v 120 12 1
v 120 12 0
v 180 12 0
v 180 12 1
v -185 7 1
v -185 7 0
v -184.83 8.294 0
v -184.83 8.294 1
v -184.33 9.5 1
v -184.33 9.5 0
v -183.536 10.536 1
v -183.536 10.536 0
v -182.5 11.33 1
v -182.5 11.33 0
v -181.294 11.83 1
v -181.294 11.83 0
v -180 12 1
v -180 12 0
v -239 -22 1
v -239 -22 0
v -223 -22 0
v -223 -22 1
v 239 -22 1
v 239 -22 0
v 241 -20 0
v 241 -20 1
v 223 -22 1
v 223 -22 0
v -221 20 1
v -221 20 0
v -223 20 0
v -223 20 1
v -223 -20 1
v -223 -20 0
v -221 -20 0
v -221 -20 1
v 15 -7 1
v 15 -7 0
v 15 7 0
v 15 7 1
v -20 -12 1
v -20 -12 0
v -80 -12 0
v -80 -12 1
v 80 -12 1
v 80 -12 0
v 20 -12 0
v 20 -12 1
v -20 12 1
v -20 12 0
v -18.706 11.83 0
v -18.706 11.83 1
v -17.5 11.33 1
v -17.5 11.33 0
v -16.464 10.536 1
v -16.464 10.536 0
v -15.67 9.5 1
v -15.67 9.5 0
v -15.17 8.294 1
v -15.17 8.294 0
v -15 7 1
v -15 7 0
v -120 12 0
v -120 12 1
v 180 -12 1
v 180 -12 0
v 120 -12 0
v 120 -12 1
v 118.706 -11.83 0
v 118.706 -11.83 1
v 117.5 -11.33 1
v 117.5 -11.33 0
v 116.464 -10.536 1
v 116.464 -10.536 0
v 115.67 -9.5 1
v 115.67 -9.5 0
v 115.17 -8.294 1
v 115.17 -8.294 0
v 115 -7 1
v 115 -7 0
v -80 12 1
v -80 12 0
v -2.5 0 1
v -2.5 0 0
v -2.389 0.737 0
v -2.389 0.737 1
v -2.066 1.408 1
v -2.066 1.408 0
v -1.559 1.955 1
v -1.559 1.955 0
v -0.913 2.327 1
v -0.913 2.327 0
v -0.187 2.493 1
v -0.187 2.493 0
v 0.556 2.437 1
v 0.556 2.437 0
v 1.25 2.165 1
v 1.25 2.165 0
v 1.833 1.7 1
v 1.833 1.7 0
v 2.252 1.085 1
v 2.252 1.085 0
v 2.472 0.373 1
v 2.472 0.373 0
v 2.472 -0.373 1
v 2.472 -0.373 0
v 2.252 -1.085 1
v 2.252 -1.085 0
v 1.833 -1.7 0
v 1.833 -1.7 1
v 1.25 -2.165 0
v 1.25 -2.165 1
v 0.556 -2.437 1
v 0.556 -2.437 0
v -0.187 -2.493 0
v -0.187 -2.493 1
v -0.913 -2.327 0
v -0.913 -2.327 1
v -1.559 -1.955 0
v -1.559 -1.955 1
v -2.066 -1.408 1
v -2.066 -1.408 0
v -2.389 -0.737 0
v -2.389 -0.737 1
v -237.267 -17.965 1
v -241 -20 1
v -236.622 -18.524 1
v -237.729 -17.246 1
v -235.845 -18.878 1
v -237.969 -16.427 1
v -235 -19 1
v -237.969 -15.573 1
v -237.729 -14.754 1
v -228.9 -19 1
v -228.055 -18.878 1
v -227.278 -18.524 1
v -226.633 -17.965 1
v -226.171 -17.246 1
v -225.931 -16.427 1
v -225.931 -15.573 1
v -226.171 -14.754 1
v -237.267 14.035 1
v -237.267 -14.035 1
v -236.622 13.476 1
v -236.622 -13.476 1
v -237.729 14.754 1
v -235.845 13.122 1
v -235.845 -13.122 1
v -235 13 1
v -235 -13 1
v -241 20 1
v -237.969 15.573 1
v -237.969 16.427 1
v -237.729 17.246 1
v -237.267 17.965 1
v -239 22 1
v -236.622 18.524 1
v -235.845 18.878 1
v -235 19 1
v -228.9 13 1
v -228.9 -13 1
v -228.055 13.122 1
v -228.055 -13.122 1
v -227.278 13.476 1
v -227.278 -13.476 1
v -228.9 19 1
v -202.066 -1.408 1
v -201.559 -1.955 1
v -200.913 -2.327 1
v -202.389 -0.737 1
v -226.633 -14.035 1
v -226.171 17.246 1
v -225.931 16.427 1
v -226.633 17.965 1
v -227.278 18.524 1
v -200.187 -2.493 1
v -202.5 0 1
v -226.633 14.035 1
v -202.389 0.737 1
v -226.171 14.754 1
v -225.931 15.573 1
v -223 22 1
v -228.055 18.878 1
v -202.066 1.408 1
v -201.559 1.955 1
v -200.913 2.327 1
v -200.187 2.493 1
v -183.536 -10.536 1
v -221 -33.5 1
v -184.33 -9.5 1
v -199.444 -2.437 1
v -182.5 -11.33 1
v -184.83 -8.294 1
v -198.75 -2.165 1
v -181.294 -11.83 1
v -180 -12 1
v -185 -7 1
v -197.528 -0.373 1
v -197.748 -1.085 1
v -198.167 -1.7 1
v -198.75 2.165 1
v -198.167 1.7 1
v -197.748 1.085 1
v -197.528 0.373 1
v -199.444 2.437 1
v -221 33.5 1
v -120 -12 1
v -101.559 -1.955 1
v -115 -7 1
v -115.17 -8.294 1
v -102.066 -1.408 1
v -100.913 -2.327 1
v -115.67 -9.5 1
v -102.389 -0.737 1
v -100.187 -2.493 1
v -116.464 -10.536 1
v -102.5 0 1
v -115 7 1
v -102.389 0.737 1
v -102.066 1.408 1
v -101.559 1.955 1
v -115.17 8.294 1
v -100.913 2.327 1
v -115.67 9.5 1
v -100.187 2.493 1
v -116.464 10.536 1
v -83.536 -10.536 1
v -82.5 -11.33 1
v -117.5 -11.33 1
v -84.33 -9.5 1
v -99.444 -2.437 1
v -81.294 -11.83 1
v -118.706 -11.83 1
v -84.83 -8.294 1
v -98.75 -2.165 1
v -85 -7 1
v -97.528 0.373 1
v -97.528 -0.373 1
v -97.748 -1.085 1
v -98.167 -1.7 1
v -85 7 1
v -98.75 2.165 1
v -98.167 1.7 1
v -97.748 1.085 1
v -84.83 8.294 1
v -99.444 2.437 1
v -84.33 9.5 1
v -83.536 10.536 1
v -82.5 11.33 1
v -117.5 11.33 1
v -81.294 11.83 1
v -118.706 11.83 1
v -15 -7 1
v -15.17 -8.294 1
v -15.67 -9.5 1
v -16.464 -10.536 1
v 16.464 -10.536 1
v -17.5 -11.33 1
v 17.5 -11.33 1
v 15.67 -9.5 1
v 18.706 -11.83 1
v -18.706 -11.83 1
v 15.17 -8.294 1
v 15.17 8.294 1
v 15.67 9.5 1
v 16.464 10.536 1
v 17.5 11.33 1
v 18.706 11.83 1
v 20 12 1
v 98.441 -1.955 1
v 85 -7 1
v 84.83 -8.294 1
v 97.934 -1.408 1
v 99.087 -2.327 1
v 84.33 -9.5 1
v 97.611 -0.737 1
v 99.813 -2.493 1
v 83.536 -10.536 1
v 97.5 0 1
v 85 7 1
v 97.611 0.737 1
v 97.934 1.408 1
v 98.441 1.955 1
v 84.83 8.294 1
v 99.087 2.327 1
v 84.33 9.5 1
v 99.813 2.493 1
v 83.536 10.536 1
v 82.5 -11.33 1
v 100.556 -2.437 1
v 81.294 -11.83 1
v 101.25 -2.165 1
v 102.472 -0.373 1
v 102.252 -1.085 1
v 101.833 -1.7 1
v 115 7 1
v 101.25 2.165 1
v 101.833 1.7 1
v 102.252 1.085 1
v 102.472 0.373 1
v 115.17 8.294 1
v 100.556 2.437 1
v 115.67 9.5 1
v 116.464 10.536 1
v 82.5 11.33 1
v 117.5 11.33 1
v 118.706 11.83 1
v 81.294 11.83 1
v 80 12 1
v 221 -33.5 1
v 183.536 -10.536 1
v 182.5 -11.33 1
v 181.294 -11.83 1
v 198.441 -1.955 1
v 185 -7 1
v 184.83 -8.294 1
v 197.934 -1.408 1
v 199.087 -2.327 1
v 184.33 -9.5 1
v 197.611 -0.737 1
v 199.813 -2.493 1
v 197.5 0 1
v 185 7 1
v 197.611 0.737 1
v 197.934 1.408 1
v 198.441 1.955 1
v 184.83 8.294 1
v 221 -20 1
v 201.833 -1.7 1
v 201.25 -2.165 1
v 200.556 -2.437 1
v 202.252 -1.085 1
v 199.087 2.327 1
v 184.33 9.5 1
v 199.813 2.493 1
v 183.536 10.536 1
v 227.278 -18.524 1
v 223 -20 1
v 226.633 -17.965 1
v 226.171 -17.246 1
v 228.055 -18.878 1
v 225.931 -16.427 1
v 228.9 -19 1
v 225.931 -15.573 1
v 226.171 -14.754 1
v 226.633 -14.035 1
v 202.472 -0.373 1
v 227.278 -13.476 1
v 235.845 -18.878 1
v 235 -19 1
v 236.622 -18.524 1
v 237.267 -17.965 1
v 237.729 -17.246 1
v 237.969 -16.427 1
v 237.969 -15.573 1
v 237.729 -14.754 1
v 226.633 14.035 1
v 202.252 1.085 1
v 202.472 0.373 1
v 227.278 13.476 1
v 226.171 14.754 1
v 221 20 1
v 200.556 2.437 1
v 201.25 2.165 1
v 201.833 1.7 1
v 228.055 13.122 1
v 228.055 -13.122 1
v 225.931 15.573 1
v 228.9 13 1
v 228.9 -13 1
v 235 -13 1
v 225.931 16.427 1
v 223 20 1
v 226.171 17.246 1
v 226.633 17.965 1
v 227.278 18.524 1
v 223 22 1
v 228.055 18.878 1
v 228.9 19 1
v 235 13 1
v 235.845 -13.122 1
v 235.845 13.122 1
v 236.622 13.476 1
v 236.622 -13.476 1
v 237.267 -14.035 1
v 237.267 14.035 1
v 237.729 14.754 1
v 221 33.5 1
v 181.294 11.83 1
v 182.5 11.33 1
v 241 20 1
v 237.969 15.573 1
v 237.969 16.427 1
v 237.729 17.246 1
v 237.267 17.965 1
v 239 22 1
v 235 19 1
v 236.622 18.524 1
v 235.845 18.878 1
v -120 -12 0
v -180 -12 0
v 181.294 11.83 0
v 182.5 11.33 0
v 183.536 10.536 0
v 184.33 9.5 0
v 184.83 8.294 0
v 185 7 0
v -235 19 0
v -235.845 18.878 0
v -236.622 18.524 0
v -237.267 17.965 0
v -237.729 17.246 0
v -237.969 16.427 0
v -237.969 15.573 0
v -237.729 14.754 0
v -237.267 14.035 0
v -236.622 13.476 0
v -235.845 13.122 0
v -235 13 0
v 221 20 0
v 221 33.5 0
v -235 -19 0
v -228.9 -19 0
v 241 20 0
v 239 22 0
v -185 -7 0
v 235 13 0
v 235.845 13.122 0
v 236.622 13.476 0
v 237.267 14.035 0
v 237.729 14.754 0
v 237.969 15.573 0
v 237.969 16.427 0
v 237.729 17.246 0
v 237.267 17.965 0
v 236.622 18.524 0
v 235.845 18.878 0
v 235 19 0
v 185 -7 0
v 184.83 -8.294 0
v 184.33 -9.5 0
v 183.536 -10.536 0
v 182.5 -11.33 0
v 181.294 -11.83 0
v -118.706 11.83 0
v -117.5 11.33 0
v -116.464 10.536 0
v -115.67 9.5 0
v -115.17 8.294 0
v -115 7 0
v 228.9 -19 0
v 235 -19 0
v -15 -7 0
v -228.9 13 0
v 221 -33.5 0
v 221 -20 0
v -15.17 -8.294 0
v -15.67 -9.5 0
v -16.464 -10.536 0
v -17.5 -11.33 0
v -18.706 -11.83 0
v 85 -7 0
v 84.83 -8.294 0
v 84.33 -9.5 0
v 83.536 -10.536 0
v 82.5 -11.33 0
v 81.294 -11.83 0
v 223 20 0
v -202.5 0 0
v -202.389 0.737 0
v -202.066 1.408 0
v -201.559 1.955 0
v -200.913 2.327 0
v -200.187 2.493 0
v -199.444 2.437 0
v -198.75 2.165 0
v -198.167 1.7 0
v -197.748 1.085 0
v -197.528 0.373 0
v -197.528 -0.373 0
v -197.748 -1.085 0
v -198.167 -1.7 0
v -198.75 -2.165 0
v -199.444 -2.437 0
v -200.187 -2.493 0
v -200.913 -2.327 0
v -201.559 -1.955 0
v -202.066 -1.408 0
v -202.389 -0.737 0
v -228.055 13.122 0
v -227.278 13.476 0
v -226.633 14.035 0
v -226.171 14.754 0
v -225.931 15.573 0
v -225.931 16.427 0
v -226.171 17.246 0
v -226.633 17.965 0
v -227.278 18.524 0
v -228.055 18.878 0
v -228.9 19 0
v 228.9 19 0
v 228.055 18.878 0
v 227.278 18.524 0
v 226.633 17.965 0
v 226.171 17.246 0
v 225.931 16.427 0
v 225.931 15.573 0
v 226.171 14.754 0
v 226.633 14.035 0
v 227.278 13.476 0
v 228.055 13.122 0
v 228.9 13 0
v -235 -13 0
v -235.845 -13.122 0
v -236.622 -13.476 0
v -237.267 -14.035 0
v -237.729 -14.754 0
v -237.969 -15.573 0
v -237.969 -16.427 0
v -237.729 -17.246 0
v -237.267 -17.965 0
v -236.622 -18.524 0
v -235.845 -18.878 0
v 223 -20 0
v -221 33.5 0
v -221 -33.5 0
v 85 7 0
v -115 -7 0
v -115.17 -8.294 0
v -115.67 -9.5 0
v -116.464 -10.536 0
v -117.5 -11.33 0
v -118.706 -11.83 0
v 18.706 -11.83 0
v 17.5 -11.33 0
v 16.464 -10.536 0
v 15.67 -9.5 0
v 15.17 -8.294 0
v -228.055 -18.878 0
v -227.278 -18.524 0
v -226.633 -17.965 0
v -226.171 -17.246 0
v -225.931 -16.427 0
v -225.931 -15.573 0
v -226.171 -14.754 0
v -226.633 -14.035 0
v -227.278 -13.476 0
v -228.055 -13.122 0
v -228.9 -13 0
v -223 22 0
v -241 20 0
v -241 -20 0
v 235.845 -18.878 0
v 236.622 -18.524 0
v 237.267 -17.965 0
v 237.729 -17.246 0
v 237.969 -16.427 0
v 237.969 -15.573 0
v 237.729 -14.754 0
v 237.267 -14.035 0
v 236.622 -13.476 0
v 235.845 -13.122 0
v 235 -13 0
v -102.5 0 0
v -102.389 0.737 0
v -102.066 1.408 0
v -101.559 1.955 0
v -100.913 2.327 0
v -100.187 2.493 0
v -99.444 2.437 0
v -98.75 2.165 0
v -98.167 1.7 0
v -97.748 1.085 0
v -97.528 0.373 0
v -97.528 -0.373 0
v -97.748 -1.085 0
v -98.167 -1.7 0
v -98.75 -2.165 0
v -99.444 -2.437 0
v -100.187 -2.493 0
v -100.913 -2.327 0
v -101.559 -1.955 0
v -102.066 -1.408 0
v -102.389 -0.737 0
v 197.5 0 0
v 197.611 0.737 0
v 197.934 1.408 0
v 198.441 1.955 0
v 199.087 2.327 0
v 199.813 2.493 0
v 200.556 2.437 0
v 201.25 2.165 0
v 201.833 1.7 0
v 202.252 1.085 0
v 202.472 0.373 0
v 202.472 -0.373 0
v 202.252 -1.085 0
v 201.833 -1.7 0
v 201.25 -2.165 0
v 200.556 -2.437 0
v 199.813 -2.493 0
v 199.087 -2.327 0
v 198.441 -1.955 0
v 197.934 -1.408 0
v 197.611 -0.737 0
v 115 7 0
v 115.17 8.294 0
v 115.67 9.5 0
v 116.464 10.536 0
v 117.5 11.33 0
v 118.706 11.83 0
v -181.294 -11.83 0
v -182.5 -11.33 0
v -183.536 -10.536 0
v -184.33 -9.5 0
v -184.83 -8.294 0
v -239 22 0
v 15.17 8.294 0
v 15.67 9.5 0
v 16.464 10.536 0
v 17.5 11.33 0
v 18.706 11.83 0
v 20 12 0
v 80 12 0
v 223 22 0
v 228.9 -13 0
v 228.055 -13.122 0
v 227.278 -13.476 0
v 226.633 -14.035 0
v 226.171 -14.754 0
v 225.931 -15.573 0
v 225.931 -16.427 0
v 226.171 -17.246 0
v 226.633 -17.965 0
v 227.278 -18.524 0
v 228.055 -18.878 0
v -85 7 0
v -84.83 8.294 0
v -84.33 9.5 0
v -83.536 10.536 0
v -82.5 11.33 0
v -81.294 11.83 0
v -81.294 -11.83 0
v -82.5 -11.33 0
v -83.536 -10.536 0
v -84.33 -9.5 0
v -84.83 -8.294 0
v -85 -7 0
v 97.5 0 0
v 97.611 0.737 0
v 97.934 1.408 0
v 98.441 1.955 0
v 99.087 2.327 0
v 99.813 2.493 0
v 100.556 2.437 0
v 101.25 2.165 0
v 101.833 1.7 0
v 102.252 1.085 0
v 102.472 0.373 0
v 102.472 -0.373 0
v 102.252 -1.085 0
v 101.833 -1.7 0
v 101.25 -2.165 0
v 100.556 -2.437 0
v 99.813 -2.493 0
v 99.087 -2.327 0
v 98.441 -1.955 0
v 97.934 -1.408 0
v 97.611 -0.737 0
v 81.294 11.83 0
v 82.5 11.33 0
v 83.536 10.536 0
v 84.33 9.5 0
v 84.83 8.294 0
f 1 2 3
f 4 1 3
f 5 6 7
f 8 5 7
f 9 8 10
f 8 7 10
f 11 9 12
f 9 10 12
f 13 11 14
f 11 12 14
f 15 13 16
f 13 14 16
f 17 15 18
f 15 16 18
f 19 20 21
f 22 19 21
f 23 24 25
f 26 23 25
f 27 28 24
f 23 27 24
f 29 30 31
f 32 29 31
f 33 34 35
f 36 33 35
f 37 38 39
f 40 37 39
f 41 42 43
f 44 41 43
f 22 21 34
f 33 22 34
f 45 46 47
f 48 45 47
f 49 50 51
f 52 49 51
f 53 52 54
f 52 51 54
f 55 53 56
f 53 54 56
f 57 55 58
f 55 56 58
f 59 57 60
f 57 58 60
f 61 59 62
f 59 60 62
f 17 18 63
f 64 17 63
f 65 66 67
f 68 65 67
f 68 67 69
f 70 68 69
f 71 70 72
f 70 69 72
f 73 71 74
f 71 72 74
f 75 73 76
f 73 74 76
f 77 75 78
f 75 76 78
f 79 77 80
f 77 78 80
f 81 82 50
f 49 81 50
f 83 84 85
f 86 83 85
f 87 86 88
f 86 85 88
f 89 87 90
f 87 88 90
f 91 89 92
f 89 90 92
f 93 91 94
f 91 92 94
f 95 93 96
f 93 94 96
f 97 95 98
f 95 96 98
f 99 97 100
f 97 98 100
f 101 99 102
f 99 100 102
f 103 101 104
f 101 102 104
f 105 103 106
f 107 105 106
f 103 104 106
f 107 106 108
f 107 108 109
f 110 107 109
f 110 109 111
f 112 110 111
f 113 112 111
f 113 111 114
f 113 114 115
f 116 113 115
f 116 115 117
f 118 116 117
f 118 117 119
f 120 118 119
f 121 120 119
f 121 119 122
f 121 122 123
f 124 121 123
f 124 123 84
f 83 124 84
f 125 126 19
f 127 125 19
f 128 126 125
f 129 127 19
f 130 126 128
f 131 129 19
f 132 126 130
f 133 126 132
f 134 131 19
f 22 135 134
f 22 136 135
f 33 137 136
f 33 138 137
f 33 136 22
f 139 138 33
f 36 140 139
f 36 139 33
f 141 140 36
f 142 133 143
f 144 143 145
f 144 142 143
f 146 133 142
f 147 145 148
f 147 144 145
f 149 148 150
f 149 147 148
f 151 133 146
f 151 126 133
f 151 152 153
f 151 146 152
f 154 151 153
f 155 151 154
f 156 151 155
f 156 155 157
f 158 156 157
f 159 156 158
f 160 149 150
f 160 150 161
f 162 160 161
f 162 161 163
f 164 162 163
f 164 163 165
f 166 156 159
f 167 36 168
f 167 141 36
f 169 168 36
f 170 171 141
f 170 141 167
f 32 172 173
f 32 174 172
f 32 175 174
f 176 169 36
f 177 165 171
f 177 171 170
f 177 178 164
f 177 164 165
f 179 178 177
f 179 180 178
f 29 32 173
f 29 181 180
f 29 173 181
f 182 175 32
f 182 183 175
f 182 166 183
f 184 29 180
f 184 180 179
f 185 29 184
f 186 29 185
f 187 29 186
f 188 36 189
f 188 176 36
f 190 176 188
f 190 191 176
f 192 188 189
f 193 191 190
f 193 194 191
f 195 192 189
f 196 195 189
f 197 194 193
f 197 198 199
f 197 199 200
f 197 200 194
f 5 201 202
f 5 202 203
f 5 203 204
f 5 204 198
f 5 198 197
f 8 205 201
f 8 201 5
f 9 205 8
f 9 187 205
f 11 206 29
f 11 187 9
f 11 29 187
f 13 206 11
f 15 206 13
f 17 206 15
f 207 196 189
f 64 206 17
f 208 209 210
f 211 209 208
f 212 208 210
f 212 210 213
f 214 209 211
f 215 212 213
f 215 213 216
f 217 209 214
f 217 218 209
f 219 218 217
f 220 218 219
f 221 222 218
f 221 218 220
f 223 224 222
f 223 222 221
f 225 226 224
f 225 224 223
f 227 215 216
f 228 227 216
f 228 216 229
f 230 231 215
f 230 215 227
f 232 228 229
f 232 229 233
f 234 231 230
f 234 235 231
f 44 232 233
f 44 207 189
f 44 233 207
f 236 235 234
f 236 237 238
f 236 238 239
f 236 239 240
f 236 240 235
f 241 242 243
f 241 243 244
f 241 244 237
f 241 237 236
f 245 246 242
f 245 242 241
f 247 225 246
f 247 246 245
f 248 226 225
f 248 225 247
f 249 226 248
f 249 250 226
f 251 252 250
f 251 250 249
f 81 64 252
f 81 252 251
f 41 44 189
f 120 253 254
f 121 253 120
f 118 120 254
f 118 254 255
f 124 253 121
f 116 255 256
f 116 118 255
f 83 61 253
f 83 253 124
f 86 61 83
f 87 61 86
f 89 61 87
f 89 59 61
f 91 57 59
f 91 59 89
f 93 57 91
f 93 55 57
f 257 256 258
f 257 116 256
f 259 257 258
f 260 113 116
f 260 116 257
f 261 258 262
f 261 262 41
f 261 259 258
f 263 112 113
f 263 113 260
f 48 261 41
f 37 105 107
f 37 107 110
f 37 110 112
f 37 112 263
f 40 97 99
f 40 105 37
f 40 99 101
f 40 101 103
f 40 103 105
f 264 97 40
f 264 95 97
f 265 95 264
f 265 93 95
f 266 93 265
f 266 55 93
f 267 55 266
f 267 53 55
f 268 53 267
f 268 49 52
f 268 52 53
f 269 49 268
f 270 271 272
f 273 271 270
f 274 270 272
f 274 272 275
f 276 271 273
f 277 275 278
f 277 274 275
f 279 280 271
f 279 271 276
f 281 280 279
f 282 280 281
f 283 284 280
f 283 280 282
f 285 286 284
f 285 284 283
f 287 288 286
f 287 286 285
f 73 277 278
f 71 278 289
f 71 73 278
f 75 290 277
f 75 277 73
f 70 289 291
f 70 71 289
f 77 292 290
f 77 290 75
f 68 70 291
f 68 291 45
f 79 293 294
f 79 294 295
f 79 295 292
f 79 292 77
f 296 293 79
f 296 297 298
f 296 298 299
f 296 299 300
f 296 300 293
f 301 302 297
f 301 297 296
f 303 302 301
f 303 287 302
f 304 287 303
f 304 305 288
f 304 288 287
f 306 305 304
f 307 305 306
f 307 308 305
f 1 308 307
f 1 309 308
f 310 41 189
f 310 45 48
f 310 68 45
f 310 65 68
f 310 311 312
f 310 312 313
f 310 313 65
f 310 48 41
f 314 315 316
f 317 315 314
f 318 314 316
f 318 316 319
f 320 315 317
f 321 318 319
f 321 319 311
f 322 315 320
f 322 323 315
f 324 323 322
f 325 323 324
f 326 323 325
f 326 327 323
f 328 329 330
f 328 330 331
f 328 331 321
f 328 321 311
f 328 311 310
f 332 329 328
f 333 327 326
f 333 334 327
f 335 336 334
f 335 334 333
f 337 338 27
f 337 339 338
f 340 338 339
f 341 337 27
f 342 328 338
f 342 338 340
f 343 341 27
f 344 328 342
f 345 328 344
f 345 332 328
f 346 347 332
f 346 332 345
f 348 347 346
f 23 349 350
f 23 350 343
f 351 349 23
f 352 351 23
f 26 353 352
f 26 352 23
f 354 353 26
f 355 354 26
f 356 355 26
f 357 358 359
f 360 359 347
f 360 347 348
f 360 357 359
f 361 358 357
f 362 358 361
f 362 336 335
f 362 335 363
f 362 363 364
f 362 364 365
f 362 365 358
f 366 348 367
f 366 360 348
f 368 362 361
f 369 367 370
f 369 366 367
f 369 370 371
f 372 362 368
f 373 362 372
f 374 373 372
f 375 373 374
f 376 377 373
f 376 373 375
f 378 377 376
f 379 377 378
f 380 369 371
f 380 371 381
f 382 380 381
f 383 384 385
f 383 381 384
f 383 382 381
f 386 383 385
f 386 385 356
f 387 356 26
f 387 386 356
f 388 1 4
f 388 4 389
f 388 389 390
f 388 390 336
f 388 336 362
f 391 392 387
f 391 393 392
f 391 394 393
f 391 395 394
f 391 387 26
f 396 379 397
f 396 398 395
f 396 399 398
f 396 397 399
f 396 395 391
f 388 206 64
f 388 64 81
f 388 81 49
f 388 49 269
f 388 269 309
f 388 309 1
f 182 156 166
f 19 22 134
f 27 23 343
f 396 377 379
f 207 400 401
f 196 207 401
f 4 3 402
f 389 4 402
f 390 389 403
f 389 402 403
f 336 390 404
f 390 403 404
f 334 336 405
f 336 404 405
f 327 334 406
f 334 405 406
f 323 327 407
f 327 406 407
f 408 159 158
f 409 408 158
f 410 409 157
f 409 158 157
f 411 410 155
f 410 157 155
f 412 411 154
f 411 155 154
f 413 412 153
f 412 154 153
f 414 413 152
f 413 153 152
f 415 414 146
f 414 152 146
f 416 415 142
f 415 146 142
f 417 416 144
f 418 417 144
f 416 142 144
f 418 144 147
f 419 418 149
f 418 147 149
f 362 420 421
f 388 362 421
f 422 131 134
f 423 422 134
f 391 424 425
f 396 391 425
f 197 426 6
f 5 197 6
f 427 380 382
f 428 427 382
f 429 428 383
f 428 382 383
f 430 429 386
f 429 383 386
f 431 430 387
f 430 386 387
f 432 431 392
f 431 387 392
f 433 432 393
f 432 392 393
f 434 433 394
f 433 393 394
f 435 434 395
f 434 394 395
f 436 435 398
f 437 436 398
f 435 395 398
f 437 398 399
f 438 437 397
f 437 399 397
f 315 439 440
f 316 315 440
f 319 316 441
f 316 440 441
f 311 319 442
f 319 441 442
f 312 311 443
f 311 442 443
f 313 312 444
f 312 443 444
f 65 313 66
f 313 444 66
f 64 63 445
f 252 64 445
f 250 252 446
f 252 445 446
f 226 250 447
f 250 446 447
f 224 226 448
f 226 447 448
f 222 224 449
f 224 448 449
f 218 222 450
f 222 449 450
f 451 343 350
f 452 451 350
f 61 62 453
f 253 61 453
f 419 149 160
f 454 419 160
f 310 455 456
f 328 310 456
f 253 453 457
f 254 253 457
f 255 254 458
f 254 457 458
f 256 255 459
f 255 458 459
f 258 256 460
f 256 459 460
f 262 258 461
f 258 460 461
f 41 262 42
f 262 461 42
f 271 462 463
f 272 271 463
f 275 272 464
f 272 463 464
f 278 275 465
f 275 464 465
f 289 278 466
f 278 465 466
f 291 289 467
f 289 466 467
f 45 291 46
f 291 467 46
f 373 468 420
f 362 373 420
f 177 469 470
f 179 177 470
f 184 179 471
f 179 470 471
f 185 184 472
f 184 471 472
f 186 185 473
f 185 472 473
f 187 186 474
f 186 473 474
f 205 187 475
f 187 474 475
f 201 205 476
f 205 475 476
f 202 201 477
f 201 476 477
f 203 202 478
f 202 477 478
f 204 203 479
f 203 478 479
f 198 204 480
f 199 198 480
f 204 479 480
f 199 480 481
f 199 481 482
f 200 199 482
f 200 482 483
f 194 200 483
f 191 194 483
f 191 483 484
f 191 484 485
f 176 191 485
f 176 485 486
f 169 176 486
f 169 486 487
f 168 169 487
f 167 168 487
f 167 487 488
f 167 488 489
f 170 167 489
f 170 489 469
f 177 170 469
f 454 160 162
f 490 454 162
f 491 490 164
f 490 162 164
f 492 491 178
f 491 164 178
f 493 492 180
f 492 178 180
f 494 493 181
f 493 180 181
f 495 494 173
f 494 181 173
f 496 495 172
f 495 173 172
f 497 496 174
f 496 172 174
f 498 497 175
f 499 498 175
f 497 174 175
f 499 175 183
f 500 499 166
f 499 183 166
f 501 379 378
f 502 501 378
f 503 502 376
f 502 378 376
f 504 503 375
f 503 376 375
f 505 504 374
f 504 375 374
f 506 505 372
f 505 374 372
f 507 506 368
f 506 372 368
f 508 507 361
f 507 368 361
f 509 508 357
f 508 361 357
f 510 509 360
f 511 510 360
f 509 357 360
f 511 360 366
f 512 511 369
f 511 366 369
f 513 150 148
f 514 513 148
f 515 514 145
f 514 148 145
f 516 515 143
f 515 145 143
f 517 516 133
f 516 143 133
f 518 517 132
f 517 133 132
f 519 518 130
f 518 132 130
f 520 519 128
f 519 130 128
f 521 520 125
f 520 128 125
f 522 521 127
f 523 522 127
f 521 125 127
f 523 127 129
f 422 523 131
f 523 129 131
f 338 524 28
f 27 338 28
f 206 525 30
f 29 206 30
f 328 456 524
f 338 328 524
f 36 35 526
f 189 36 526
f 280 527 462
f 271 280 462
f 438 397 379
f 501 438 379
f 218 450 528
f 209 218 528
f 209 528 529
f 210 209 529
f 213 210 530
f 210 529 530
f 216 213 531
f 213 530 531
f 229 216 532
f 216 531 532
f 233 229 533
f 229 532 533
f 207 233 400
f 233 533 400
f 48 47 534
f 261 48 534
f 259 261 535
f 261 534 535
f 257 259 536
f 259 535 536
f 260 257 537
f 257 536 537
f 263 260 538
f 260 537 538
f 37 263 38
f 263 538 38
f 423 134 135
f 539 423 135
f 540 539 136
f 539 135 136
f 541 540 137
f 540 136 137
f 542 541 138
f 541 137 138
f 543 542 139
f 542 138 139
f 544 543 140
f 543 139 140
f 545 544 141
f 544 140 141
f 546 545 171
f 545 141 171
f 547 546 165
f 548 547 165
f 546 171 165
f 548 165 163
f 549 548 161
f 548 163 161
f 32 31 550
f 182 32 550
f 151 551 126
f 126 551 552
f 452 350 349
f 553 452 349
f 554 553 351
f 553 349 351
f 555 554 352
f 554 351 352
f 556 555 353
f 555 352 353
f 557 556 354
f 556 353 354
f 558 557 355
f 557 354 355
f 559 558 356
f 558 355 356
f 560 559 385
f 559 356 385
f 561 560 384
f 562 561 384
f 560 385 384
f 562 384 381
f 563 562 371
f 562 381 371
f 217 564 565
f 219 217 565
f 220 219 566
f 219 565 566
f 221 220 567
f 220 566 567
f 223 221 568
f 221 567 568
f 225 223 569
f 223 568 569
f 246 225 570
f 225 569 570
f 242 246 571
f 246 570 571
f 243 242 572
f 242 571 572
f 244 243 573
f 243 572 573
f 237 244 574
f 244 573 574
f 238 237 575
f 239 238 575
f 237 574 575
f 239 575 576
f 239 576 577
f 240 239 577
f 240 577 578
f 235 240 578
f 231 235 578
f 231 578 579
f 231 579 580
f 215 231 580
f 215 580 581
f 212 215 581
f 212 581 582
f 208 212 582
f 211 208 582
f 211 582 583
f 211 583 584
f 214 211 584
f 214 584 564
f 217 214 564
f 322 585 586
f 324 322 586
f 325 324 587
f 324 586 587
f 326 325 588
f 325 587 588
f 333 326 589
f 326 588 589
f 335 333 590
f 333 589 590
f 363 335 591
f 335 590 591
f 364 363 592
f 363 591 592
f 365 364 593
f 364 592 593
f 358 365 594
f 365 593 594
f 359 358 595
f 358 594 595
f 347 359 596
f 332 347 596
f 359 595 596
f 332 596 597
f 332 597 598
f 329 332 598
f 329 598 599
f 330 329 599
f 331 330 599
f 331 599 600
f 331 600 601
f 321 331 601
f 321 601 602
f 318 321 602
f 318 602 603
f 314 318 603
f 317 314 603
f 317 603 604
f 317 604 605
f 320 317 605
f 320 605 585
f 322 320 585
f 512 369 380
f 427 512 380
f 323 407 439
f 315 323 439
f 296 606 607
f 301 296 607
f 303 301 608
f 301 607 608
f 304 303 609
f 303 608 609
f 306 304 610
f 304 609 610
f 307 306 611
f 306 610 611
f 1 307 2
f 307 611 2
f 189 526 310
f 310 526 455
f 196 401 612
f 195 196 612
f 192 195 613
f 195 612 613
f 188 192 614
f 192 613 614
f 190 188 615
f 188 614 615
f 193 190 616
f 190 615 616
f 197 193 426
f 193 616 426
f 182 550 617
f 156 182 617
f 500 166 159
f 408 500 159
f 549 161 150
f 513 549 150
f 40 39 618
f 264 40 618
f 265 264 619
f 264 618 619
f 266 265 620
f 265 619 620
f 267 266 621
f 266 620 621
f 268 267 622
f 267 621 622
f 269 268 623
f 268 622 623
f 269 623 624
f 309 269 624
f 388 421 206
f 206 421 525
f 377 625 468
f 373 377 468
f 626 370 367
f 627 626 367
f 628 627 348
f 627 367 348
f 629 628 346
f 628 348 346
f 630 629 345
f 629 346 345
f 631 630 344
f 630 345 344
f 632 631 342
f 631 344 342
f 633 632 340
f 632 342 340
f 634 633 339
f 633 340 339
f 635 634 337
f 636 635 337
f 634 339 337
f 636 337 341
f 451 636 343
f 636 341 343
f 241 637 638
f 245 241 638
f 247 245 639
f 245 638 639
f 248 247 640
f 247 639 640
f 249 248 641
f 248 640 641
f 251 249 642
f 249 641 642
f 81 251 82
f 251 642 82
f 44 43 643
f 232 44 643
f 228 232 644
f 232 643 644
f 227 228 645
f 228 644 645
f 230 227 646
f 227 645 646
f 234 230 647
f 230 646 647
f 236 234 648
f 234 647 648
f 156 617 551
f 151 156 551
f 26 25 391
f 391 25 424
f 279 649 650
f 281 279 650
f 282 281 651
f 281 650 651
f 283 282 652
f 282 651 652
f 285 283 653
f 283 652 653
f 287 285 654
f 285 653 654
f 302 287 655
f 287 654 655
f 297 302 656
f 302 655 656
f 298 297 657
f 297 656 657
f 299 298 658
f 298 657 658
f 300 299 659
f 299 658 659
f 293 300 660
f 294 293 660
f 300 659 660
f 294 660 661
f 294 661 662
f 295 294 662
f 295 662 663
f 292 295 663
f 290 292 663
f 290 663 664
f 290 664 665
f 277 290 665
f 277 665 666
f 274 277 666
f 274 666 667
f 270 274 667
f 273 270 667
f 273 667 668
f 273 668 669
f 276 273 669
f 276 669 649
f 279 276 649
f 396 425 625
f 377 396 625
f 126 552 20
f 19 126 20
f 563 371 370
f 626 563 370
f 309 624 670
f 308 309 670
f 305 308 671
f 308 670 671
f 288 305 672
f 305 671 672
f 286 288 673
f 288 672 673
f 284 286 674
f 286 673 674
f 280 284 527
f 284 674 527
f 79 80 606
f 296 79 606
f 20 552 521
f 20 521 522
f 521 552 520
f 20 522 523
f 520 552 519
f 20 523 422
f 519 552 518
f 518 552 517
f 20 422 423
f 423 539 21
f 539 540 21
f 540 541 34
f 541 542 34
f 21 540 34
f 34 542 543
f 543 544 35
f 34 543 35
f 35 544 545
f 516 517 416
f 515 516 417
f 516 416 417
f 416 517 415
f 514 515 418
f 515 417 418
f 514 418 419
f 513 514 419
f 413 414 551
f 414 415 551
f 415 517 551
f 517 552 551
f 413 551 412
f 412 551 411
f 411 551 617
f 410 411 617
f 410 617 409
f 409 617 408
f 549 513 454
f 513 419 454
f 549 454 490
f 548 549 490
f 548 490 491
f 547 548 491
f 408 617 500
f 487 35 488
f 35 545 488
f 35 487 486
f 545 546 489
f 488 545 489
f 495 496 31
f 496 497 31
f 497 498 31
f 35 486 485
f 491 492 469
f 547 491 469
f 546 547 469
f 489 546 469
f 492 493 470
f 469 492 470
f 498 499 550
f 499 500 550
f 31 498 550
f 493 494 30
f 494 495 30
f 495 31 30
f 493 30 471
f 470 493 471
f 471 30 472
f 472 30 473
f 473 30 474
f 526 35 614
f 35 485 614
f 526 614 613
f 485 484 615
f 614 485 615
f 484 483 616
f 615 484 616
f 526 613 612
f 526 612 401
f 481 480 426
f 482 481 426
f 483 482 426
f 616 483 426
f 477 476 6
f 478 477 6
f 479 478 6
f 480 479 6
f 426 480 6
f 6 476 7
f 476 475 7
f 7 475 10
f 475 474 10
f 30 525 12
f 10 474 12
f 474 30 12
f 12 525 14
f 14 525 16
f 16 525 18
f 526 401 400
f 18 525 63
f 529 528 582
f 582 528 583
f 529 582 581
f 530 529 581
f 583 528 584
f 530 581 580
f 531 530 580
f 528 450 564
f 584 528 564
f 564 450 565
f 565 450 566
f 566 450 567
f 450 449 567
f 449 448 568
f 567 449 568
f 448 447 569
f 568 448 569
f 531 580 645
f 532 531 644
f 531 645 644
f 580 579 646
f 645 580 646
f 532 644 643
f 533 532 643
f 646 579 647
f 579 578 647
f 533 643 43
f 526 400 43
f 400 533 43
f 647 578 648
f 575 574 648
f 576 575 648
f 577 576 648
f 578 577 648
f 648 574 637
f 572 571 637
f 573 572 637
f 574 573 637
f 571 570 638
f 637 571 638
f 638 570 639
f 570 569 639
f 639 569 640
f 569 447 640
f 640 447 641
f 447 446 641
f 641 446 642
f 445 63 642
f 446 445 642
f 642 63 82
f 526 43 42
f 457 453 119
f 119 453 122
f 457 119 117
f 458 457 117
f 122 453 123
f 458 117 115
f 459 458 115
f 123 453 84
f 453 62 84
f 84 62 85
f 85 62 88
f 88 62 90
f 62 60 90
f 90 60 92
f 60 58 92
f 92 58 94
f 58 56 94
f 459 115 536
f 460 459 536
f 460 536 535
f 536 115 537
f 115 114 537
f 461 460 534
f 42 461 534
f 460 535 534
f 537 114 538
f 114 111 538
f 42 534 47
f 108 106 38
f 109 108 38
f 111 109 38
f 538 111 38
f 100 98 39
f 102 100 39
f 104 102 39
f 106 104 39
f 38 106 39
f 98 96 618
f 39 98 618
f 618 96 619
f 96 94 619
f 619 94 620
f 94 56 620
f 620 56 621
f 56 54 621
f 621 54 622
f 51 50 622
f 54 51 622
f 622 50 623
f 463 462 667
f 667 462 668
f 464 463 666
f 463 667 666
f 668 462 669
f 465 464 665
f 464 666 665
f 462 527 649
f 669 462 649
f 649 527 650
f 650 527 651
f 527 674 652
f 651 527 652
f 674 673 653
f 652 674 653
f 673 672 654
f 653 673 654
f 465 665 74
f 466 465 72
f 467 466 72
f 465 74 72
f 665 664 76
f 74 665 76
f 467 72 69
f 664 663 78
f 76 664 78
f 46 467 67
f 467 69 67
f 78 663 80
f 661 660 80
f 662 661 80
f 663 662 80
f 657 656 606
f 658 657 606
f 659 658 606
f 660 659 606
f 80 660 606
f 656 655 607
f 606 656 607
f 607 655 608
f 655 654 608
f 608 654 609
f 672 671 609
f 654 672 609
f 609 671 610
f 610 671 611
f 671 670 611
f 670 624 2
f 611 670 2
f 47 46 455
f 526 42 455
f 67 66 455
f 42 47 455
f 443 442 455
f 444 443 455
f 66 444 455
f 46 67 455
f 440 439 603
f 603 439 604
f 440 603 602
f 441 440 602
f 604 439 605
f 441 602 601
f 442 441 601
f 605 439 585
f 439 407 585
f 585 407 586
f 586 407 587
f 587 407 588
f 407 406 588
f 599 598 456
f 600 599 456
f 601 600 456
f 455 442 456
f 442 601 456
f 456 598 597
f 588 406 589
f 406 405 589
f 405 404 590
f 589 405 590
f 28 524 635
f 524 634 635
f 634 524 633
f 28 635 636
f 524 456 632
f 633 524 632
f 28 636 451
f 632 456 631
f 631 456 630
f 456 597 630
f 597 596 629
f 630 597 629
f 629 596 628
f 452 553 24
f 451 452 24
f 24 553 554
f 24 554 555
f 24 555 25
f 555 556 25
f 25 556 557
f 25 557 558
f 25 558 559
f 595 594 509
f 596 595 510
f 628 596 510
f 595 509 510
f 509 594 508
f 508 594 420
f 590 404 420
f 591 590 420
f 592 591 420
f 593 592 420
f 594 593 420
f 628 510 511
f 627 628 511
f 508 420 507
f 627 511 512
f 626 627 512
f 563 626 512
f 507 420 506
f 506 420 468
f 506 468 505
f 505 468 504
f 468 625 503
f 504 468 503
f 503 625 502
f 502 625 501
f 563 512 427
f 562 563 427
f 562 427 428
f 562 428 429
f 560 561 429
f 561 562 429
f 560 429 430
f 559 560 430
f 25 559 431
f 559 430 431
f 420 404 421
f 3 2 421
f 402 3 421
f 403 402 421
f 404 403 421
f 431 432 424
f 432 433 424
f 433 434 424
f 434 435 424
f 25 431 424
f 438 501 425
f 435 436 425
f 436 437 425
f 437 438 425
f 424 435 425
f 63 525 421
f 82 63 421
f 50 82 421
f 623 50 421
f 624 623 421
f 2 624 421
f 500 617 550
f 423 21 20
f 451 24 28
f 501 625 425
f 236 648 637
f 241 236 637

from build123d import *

# Parameters (mm, degrees)
F1_DEPTH = 1
F3_D     = 5
F5_DEPTH = 25
F7_DEPTH = 25


with BuildPart() as f1:
    # F0 (on Top) → F1 (new body)
    with BuildSketch(Plane.XY):
        Polygon((221, 20), (221, 33.5), (0, 33.5), (-221, 33.5), (-221, 20), (-223, 20), (-223, 22), (-239, 22), (-241, 20), (-241, 0), (-241, -20), (-239, -22), (-223, -22), (-223, -20), (-221, -20), (-221, -33.5), (0, -33.5), (221, -33.5), (221, -20), (223, -20), (223, -22), (239, -22), (241, -20), (241, 0), (241, 20), (239, 22), (223, 22), (223, 20), align=None)
    extrude(amount=F1_DEPTH)

    # F3 (through all)
    with Locations(Plane.XY.offset(1)):
        with Locations((-200, 0), (-100, 0), (0, 0), (100, 0), (200, 0)):
            Hole(F3_D / 2)

    # F4 (on face) → F5 (cut)
    with BuildSketch(Plane.XY.offset(1)):
        with BuildLine():
            Line((-228.9, -13), (-235, -13))
            ThreePointArc((-235, -13), (-238, -16), (-235, -19))
            Line((-235, -19), (-228.9, -19))
            ThreePointArc((-228.9, -19), (-225.9, -16), (-228.9, -13))
        make_face()
        with BuildLine():
            ThreePointArc((-235, 19), (-238, 16), (-235, 13))
            Line((-235, 13), (-228.9, 13))
            ThreePointArc((-228.9, 13), (-225.9, 16), (-228.9, 19))
            Line((-228.9, 19), (-235, 19))
        make_face()
        with BuildLine():
            Line((228.9, 13), (235, 13))
            ThreePointArc((235, 13), (238, 16), (235, 19))
            Line((235, 19), (228.9, 19))
            ThreePointArc((228.9, 19), (225.9, 16), (228.9, 13))
        make_face()
        with BuildLine():
            ThreePointArc((228.9, -13), (225.9, -16), (228.9, -19))
            Line((228.9, -19), (235, -19))
            ThreePointArc((235, -19), (238, -16), (235, -13))
            Line((235, -13), (228.9, -13))
        make_face()
    extrude(amount=-F5_DEPTH, mode=Mode.SUBTRACT)

    # F6 (on face) → F7 (cut)
    with BuildSketch(Plane(origin=(0, 0, 0), x_dir=(1, 0, 0), z_dir=(0, 0, -1))):
        with BuildLine():
            ThreePointArc((120, 12), (116.464466, 10.535534), (115, 7))
            Line((115, 7), (115, -7))
            ThreePointArc((115, -7), (116.464466, -10.535534), (120, -12))
            Line((120, -12), (180, -12))
            ThreePointArc((180, -12), (183.535534, -10.535534), (185, -7))
            Line((185, -7), (185, 7))
            ThreePointArc((185, 7), (183.535534, 10.535534), (180, 12))
            Line((180, 12), (120, 12))
        make_face()
        with BuildLine():
            ThreePointArc((20, 12), (16.464466, 10.535534), (15, 7))
            Line((15, 7), (15, -7))
            ThreePointArc((15, -7), (16.464466, -10.535534), (20, -12))
            Line((20, -12), (80, -12))
            ThreePointArc((80, -12), (83.535534, -10.535534), (85, -7))
            Line((85, -7), (85, 7))
            ThreePointArc((85, 7), (83.535534, 10.535534), (80, 12))
            Line((80, 12), (20, 12))
        make_face()
        with BuildLine():
            ThreePointArc((-15, 7), (-16.464466, 10.535534), (-20, 12))
            Line((-20, 12), (-80, 12))
            ThreePointArc((-80, 12), (-83.535534, 10.535534), (-85, 7))
            Line((-85, 7), (-85, -7))
            ThreePointArc((-85, -7), (-83.535534, -10.535534), (-80, -12))
            Line((-80, -12), (-20, -12))
            ThreePointArc((-20, -12), (-16.464466, -10.535534), (-15, -7))
            Line((-15, -7), (-15, 7))
        make_face()
        with BuildLine():
            ThreePointArc((-115, 7), (-116.464466, 10.535534), (-120, 12))
            Line((-120, 12), (-180, 12))
            ThreePointArc((-180, 12), (-183.535534, 10.535534), (-185, 7))
            Line((-185, 7), (-185, -7))
            ThreePointArc((-185, -7), (-183.535534, -10.535534), (-180, -12))
            Line((-180, -12), (-120, -12))
            ThreePointArc((-120, -12), (-116.464466, -10.535534), (-115, -7))
            Line((-115, -7), (-115, 7))
        make_face()
    extrude(amount=-F7_DEPTH, mode=Mode.SUBTRACT)


solid = f1.part
